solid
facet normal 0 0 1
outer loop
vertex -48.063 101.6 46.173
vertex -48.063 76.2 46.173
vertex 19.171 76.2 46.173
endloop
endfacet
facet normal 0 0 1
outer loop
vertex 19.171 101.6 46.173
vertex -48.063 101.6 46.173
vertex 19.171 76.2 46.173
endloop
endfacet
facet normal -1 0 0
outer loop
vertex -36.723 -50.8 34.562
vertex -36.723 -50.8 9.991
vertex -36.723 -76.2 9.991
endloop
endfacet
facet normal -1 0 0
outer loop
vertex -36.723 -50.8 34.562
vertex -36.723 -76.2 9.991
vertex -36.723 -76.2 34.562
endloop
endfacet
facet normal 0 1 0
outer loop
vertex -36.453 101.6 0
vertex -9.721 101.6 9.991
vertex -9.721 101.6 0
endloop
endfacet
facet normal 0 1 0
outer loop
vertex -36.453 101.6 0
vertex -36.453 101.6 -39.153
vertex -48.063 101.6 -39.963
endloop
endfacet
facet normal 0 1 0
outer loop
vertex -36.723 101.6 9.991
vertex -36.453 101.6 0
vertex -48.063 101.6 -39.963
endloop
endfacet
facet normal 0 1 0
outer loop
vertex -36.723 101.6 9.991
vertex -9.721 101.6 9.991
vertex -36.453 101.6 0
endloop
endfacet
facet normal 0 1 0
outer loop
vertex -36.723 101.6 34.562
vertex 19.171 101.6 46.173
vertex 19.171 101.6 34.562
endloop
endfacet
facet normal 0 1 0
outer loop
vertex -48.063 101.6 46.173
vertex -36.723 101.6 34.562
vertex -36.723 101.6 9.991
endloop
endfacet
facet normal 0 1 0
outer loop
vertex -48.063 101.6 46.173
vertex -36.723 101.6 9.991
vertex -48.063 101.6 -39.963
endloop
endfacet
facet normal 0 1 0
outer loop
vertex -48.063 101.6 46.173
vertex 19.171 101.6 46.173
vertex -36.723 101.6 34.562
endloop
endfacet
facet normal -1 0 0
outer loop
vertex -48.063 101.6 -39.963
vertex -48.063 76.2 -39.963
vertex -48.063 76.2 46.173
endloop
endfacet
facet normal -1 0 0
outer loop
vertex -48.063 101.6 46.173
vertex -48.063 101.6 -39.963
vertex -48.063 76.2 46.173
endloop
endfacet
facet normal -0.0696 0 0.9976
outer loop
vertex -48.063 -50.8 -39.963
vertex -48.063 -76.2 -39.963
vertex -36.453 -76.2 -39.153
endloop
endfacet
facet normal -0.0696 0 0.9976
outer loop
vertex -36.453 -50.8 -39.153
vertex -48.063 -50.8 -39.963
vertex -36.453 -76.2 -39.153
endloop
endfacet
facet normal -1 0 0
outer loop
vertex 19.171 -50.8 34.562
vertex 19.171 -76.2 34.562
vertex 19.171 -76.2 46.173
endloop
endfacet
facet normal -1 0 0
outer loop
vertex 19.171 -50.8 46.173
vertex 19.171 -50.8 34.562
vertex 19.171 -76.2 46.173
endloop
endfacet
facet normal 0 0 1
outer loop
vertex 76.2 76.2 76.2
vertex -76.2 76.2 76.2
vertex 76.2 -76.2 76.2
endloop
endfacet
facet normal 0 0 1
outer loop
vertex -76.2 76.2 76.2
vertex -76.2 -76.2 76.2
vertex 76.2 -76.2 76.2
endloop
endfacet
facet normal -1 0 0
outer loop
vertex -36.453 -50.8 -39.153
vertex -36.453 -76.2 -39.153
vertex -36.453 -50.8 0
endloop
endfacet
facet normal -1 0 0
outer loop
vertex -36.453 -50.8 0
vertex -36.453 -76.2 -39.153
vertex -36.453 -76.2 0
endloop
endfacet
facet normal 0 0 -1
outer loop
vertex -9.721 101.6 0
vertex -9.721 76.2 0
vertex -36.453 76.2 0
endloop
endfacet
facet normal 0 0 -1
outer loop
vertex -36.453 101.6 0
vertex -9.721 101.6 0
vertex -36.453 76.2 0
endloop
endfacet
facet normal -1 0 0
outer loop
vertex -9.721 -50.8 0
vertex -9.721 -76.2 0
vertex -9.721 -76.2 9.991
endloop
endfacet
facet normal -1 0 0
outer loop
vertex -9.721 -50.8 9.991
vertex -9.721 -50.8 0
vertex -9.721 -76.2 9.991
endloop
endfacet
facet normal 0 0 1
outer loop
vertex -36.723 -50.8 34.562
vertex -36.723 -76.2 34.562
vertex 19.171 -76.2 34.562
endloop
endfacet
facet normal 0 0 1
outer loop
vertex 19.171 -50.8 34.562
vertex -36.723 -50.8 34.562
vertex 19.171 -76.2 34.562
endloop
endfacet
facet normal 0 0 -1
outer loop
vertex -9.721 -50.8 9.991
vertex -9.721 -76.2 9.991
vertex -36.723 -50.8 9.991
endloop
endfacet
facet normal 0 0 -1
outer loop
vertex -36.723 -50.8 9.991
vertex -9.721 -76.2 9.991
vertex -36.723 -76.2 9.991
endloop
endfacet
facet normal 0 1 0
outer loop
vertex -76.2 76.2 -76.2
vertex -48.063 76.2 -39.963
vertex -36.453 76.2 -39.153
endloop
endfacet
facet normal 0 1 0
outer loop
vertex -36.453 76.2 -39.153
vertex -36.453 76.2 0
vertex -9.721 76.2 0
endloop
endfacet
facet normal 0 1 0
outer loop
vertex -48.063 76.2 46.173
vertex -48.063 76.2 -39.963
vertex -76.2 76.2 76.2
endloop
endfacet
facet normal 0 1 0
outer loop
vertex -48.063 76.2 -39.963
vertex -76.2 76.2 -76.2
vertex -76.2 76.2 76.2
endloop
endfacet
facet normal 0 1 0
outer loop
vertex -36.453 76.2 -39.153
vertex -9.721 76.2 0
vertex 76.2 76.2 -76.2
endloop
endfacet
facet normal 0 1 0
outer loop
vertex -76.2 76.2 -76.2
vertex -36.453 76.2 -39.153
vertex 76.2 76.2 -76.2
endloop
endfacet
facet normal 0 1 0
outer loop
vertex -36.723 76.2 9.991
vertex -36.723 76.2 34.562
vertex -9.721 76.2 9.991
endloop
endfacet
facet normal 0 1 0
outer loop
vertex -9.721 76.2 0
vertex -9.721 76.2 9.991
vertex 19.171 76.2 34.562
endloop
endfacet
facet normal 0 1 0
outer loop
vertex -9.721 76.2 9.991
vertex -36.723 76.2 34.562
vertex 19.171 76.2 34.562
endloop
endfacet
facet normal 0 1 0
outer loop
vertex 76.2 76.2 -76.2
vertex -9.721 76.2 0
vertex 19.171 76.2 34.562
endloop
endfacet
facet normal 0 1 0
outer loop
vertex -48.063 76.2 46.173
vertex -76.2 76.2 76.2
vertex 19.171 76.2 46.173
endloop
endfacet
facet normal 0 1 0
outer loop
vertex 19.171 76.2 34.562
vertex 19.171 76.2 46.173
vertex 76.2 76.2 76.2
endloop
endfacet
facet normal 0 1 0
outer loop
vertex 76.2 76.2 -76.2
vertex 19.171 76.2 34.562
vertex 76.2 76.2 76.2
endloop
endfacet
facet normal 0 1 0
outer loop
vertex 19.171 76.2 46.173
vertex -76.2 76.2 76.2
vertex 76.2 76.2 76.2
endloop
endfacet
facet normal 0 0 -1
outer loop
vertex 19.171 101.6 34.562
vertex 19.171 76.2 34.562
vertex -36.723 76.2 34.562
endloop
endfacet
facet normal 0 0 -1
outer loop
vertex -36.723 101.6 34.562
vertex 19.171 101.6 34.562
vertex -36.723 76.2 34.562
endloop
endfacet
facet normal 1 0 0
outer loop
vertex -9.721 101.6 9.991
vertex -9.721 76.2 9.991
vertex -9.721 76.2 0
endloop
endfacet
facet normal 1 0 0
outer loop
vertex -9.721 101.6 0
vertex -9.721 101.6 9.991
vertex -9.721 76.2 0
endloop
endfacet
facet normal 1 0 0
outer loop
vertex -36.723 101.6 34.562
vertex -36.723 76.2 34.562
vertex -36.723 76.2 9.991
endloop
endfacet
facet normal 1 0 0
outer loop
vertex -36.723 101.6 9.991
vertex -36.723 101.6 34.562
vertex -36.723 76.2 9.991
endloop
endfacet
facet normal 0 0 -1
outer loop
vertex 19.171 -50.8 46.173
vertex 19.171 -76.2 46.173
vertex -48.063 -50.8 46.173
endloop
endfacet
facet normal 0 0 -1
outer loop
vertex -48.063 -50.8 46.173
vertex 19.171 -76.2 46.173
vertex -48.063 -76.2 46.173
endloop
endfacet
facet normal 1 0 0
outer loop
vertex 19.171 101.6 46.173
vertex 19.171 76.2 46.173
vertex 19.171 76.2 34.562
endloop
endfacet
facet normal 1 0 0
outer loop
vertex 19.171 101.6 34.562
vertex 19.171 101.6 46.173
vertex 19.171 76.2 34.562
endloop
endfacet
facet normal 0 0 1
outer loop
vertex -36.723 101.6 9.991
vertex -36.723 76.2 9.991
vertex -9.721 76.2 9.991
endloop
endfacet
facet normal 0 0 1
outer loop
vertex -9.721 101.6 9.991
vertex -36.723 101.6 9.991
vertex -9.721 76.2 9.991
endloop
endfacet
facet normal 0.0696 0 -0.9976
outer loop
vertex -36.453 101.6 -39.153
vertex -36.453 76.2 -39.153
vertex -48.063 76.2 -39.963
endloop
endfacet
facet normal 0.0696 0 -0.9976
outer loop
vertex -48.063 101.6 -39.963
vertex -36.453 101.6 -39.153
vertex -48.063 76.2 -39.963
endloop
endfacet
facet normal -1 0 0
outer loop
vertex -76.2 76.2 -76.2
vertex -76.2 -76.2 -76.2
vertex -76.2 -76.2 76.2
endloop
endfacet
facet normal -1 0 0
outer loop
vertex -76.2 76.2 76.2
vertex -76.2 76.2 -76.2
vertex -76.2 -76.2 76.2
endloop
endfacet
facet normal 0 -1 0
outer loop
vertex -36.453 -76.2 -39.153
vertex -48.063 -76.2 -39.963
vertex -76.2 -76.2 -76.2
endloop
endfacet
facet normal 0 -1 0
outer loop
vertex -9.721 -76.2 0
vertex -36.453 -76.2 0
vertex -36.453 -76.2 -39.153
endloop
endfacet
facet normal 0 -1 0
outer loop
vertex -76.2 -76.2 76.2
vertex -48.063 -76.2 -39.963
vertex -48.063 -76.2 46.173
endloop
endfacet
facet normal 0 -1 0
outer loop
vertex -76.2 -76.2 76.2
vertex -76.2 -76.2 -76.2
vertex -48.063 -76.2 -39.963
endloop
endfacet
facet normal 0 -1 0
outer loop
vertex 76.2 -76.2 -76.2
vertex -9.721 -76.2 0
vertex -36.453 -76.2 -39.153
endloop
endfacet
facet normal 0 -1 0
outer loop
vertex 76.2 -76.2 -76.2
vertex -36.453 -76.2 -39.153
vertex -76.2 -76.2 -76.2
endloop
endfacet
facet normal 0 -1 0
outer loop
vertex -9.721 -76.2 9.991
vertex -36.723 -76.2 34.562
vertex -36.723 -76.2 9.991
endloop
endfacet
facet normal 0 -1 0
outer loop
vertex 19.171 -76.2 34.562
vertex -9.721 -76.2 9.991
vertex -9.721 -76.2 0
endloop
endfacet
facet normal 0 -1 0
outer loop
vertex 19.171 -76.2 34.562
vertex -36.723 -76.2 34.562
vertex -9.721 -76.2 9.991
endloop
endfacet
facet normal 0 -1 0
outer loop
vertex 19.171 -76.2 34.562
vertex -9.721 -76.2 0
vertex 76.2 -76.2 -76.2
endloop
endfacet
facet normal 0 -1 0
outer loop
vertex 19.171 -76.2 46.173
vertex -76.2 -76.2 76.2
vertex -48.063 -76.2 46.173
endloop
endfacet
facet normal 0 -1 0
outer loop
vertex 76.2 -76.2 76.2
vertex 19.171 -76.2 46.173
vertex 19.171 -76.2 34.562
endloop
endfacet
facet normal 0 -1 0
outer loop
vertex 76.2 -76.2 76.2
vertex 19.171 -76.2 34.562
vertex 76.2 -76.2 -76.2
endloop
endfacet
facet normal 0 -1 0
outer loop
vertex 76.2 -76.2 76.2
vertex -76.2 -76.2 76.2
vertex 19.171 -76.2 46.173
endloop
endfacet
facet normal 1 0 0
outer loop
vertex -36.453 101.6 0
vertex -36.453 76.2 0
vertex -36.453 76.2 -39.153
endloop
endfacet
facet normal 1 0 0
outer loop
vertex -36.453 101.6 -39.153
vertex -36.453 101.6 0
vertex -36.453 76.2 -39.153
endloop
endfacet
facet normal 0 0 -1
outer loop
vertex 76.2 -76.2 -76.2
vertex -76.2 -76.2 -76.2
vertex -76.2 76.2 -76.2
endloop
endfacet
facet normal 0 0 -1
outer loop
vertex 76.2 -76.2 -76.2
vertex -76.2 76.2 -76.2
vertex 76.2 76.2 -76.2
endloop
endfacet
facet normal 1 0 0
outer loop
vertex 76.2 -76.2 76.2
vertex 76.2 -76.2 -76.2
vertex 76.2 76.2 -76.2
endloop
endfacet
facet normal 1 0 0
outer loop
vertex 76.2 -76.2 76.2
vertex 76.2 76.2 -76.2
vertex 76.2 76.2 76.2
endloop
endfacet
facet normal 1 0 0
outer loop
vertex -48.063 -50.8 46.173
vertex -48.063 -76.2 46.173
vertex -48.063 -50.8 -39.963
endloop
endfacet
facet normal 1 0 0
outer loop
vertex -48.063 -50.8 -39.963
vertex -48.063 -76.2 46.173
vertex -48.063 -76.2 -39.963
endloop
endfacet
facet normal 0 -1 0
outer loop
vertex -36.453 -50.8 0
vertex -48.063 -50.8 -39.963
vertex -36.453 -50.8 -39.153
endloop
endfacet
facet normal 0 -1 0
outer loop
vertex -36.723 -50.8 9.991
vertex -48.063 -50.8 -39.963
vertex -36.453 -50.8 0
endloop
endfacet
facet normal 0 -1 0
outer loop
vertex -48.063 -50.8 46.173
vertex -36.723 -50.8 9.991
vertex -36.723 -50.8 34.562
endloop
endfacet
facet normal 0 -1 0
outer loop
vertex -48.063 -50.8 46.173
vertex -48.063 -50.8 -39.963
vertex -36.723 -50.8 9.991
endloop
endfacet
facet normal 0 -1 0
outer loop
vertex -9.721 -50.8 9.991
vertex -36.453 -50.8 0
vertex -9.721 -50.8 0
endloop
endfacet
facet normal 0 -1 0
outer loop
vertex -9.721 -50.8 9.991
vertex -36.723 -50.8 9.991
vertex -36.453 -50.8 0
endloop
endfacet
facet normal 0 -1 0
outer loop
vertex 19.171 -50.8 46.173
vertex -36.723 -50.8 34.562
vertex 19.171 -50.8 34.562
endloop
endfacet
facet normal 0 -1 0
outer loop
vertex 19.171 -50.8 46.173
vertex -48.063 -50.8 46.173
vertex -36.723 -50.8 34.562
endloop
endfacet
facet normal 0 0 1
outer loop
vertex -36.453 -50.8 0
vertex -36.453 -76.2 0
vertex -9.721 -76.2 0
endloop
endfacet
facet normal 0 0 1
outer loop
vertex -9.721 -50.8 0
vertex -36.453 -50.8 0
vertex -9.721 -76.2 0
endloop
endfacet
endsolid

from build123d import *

# Parameters (mm, degrees)
F1_W     = 152.4
F1_H     = 152.4
F2_DEPTH = 76.2
F4_DEPTH = 25.4
F6_DEPTH = 25.4


# Not quite as in the source:
# - a variable given as a bare number and used for a length is read in inches; the dataset says mm whatever the document's units were


with BuildPart() as f2:
    # F1 (on Front) → F2 (new body, symmetric)
    with BuildSketch(Plane.XZ):
        Rectangle(F1_W, F1_H)
    extrude(amount=F2_DEPTH, both=True)

    # F3 (on face) → F4 (cut)
    with BuildSketch(Plane.XZ.offset(76.2)):
        Polygon((19.1713254899, 46.1731813848), (-48.0633080006, 46.1731813848), (-48.0633080006, -39.9627536535), (-36.4525094628, -39.1526967287), (-36.4525094628, 0), (-9.720666334, 0), (-9.720666334, 9.9906884134), (-36.7225259542, 9.9906884134), (-36.7225259542, 34.5623828471), (19.1713254899, 34.5623828471), align=None)
    extrude(amount=-F4_DEPTH, mode=Mode.SUBTRACT)

    # F5 (on face) → F6 (join)
    with BuildSketch(Plane(origin=(0, 76.2, 0), x_dir=(-1, 0, 0), z_dir=(0, 1, 0))):
        Polygon((48.0633080006, -39.9627536535), (48.0633080006, 46.1731813848), (-19.1713254899, 46.1731813848), (-19.1713254899, 34.5623828471), (36.7225259542, 34.5623828471), (36.7225259542, 9.9906884134), (9.720666334, 9.9906884134), (9.720666334, 0), (36.4525094628, 0), (36.4525094628, -39.1526967287), align=None)
    extrude(amount=F6_DEPTH)


solid = f2.part
